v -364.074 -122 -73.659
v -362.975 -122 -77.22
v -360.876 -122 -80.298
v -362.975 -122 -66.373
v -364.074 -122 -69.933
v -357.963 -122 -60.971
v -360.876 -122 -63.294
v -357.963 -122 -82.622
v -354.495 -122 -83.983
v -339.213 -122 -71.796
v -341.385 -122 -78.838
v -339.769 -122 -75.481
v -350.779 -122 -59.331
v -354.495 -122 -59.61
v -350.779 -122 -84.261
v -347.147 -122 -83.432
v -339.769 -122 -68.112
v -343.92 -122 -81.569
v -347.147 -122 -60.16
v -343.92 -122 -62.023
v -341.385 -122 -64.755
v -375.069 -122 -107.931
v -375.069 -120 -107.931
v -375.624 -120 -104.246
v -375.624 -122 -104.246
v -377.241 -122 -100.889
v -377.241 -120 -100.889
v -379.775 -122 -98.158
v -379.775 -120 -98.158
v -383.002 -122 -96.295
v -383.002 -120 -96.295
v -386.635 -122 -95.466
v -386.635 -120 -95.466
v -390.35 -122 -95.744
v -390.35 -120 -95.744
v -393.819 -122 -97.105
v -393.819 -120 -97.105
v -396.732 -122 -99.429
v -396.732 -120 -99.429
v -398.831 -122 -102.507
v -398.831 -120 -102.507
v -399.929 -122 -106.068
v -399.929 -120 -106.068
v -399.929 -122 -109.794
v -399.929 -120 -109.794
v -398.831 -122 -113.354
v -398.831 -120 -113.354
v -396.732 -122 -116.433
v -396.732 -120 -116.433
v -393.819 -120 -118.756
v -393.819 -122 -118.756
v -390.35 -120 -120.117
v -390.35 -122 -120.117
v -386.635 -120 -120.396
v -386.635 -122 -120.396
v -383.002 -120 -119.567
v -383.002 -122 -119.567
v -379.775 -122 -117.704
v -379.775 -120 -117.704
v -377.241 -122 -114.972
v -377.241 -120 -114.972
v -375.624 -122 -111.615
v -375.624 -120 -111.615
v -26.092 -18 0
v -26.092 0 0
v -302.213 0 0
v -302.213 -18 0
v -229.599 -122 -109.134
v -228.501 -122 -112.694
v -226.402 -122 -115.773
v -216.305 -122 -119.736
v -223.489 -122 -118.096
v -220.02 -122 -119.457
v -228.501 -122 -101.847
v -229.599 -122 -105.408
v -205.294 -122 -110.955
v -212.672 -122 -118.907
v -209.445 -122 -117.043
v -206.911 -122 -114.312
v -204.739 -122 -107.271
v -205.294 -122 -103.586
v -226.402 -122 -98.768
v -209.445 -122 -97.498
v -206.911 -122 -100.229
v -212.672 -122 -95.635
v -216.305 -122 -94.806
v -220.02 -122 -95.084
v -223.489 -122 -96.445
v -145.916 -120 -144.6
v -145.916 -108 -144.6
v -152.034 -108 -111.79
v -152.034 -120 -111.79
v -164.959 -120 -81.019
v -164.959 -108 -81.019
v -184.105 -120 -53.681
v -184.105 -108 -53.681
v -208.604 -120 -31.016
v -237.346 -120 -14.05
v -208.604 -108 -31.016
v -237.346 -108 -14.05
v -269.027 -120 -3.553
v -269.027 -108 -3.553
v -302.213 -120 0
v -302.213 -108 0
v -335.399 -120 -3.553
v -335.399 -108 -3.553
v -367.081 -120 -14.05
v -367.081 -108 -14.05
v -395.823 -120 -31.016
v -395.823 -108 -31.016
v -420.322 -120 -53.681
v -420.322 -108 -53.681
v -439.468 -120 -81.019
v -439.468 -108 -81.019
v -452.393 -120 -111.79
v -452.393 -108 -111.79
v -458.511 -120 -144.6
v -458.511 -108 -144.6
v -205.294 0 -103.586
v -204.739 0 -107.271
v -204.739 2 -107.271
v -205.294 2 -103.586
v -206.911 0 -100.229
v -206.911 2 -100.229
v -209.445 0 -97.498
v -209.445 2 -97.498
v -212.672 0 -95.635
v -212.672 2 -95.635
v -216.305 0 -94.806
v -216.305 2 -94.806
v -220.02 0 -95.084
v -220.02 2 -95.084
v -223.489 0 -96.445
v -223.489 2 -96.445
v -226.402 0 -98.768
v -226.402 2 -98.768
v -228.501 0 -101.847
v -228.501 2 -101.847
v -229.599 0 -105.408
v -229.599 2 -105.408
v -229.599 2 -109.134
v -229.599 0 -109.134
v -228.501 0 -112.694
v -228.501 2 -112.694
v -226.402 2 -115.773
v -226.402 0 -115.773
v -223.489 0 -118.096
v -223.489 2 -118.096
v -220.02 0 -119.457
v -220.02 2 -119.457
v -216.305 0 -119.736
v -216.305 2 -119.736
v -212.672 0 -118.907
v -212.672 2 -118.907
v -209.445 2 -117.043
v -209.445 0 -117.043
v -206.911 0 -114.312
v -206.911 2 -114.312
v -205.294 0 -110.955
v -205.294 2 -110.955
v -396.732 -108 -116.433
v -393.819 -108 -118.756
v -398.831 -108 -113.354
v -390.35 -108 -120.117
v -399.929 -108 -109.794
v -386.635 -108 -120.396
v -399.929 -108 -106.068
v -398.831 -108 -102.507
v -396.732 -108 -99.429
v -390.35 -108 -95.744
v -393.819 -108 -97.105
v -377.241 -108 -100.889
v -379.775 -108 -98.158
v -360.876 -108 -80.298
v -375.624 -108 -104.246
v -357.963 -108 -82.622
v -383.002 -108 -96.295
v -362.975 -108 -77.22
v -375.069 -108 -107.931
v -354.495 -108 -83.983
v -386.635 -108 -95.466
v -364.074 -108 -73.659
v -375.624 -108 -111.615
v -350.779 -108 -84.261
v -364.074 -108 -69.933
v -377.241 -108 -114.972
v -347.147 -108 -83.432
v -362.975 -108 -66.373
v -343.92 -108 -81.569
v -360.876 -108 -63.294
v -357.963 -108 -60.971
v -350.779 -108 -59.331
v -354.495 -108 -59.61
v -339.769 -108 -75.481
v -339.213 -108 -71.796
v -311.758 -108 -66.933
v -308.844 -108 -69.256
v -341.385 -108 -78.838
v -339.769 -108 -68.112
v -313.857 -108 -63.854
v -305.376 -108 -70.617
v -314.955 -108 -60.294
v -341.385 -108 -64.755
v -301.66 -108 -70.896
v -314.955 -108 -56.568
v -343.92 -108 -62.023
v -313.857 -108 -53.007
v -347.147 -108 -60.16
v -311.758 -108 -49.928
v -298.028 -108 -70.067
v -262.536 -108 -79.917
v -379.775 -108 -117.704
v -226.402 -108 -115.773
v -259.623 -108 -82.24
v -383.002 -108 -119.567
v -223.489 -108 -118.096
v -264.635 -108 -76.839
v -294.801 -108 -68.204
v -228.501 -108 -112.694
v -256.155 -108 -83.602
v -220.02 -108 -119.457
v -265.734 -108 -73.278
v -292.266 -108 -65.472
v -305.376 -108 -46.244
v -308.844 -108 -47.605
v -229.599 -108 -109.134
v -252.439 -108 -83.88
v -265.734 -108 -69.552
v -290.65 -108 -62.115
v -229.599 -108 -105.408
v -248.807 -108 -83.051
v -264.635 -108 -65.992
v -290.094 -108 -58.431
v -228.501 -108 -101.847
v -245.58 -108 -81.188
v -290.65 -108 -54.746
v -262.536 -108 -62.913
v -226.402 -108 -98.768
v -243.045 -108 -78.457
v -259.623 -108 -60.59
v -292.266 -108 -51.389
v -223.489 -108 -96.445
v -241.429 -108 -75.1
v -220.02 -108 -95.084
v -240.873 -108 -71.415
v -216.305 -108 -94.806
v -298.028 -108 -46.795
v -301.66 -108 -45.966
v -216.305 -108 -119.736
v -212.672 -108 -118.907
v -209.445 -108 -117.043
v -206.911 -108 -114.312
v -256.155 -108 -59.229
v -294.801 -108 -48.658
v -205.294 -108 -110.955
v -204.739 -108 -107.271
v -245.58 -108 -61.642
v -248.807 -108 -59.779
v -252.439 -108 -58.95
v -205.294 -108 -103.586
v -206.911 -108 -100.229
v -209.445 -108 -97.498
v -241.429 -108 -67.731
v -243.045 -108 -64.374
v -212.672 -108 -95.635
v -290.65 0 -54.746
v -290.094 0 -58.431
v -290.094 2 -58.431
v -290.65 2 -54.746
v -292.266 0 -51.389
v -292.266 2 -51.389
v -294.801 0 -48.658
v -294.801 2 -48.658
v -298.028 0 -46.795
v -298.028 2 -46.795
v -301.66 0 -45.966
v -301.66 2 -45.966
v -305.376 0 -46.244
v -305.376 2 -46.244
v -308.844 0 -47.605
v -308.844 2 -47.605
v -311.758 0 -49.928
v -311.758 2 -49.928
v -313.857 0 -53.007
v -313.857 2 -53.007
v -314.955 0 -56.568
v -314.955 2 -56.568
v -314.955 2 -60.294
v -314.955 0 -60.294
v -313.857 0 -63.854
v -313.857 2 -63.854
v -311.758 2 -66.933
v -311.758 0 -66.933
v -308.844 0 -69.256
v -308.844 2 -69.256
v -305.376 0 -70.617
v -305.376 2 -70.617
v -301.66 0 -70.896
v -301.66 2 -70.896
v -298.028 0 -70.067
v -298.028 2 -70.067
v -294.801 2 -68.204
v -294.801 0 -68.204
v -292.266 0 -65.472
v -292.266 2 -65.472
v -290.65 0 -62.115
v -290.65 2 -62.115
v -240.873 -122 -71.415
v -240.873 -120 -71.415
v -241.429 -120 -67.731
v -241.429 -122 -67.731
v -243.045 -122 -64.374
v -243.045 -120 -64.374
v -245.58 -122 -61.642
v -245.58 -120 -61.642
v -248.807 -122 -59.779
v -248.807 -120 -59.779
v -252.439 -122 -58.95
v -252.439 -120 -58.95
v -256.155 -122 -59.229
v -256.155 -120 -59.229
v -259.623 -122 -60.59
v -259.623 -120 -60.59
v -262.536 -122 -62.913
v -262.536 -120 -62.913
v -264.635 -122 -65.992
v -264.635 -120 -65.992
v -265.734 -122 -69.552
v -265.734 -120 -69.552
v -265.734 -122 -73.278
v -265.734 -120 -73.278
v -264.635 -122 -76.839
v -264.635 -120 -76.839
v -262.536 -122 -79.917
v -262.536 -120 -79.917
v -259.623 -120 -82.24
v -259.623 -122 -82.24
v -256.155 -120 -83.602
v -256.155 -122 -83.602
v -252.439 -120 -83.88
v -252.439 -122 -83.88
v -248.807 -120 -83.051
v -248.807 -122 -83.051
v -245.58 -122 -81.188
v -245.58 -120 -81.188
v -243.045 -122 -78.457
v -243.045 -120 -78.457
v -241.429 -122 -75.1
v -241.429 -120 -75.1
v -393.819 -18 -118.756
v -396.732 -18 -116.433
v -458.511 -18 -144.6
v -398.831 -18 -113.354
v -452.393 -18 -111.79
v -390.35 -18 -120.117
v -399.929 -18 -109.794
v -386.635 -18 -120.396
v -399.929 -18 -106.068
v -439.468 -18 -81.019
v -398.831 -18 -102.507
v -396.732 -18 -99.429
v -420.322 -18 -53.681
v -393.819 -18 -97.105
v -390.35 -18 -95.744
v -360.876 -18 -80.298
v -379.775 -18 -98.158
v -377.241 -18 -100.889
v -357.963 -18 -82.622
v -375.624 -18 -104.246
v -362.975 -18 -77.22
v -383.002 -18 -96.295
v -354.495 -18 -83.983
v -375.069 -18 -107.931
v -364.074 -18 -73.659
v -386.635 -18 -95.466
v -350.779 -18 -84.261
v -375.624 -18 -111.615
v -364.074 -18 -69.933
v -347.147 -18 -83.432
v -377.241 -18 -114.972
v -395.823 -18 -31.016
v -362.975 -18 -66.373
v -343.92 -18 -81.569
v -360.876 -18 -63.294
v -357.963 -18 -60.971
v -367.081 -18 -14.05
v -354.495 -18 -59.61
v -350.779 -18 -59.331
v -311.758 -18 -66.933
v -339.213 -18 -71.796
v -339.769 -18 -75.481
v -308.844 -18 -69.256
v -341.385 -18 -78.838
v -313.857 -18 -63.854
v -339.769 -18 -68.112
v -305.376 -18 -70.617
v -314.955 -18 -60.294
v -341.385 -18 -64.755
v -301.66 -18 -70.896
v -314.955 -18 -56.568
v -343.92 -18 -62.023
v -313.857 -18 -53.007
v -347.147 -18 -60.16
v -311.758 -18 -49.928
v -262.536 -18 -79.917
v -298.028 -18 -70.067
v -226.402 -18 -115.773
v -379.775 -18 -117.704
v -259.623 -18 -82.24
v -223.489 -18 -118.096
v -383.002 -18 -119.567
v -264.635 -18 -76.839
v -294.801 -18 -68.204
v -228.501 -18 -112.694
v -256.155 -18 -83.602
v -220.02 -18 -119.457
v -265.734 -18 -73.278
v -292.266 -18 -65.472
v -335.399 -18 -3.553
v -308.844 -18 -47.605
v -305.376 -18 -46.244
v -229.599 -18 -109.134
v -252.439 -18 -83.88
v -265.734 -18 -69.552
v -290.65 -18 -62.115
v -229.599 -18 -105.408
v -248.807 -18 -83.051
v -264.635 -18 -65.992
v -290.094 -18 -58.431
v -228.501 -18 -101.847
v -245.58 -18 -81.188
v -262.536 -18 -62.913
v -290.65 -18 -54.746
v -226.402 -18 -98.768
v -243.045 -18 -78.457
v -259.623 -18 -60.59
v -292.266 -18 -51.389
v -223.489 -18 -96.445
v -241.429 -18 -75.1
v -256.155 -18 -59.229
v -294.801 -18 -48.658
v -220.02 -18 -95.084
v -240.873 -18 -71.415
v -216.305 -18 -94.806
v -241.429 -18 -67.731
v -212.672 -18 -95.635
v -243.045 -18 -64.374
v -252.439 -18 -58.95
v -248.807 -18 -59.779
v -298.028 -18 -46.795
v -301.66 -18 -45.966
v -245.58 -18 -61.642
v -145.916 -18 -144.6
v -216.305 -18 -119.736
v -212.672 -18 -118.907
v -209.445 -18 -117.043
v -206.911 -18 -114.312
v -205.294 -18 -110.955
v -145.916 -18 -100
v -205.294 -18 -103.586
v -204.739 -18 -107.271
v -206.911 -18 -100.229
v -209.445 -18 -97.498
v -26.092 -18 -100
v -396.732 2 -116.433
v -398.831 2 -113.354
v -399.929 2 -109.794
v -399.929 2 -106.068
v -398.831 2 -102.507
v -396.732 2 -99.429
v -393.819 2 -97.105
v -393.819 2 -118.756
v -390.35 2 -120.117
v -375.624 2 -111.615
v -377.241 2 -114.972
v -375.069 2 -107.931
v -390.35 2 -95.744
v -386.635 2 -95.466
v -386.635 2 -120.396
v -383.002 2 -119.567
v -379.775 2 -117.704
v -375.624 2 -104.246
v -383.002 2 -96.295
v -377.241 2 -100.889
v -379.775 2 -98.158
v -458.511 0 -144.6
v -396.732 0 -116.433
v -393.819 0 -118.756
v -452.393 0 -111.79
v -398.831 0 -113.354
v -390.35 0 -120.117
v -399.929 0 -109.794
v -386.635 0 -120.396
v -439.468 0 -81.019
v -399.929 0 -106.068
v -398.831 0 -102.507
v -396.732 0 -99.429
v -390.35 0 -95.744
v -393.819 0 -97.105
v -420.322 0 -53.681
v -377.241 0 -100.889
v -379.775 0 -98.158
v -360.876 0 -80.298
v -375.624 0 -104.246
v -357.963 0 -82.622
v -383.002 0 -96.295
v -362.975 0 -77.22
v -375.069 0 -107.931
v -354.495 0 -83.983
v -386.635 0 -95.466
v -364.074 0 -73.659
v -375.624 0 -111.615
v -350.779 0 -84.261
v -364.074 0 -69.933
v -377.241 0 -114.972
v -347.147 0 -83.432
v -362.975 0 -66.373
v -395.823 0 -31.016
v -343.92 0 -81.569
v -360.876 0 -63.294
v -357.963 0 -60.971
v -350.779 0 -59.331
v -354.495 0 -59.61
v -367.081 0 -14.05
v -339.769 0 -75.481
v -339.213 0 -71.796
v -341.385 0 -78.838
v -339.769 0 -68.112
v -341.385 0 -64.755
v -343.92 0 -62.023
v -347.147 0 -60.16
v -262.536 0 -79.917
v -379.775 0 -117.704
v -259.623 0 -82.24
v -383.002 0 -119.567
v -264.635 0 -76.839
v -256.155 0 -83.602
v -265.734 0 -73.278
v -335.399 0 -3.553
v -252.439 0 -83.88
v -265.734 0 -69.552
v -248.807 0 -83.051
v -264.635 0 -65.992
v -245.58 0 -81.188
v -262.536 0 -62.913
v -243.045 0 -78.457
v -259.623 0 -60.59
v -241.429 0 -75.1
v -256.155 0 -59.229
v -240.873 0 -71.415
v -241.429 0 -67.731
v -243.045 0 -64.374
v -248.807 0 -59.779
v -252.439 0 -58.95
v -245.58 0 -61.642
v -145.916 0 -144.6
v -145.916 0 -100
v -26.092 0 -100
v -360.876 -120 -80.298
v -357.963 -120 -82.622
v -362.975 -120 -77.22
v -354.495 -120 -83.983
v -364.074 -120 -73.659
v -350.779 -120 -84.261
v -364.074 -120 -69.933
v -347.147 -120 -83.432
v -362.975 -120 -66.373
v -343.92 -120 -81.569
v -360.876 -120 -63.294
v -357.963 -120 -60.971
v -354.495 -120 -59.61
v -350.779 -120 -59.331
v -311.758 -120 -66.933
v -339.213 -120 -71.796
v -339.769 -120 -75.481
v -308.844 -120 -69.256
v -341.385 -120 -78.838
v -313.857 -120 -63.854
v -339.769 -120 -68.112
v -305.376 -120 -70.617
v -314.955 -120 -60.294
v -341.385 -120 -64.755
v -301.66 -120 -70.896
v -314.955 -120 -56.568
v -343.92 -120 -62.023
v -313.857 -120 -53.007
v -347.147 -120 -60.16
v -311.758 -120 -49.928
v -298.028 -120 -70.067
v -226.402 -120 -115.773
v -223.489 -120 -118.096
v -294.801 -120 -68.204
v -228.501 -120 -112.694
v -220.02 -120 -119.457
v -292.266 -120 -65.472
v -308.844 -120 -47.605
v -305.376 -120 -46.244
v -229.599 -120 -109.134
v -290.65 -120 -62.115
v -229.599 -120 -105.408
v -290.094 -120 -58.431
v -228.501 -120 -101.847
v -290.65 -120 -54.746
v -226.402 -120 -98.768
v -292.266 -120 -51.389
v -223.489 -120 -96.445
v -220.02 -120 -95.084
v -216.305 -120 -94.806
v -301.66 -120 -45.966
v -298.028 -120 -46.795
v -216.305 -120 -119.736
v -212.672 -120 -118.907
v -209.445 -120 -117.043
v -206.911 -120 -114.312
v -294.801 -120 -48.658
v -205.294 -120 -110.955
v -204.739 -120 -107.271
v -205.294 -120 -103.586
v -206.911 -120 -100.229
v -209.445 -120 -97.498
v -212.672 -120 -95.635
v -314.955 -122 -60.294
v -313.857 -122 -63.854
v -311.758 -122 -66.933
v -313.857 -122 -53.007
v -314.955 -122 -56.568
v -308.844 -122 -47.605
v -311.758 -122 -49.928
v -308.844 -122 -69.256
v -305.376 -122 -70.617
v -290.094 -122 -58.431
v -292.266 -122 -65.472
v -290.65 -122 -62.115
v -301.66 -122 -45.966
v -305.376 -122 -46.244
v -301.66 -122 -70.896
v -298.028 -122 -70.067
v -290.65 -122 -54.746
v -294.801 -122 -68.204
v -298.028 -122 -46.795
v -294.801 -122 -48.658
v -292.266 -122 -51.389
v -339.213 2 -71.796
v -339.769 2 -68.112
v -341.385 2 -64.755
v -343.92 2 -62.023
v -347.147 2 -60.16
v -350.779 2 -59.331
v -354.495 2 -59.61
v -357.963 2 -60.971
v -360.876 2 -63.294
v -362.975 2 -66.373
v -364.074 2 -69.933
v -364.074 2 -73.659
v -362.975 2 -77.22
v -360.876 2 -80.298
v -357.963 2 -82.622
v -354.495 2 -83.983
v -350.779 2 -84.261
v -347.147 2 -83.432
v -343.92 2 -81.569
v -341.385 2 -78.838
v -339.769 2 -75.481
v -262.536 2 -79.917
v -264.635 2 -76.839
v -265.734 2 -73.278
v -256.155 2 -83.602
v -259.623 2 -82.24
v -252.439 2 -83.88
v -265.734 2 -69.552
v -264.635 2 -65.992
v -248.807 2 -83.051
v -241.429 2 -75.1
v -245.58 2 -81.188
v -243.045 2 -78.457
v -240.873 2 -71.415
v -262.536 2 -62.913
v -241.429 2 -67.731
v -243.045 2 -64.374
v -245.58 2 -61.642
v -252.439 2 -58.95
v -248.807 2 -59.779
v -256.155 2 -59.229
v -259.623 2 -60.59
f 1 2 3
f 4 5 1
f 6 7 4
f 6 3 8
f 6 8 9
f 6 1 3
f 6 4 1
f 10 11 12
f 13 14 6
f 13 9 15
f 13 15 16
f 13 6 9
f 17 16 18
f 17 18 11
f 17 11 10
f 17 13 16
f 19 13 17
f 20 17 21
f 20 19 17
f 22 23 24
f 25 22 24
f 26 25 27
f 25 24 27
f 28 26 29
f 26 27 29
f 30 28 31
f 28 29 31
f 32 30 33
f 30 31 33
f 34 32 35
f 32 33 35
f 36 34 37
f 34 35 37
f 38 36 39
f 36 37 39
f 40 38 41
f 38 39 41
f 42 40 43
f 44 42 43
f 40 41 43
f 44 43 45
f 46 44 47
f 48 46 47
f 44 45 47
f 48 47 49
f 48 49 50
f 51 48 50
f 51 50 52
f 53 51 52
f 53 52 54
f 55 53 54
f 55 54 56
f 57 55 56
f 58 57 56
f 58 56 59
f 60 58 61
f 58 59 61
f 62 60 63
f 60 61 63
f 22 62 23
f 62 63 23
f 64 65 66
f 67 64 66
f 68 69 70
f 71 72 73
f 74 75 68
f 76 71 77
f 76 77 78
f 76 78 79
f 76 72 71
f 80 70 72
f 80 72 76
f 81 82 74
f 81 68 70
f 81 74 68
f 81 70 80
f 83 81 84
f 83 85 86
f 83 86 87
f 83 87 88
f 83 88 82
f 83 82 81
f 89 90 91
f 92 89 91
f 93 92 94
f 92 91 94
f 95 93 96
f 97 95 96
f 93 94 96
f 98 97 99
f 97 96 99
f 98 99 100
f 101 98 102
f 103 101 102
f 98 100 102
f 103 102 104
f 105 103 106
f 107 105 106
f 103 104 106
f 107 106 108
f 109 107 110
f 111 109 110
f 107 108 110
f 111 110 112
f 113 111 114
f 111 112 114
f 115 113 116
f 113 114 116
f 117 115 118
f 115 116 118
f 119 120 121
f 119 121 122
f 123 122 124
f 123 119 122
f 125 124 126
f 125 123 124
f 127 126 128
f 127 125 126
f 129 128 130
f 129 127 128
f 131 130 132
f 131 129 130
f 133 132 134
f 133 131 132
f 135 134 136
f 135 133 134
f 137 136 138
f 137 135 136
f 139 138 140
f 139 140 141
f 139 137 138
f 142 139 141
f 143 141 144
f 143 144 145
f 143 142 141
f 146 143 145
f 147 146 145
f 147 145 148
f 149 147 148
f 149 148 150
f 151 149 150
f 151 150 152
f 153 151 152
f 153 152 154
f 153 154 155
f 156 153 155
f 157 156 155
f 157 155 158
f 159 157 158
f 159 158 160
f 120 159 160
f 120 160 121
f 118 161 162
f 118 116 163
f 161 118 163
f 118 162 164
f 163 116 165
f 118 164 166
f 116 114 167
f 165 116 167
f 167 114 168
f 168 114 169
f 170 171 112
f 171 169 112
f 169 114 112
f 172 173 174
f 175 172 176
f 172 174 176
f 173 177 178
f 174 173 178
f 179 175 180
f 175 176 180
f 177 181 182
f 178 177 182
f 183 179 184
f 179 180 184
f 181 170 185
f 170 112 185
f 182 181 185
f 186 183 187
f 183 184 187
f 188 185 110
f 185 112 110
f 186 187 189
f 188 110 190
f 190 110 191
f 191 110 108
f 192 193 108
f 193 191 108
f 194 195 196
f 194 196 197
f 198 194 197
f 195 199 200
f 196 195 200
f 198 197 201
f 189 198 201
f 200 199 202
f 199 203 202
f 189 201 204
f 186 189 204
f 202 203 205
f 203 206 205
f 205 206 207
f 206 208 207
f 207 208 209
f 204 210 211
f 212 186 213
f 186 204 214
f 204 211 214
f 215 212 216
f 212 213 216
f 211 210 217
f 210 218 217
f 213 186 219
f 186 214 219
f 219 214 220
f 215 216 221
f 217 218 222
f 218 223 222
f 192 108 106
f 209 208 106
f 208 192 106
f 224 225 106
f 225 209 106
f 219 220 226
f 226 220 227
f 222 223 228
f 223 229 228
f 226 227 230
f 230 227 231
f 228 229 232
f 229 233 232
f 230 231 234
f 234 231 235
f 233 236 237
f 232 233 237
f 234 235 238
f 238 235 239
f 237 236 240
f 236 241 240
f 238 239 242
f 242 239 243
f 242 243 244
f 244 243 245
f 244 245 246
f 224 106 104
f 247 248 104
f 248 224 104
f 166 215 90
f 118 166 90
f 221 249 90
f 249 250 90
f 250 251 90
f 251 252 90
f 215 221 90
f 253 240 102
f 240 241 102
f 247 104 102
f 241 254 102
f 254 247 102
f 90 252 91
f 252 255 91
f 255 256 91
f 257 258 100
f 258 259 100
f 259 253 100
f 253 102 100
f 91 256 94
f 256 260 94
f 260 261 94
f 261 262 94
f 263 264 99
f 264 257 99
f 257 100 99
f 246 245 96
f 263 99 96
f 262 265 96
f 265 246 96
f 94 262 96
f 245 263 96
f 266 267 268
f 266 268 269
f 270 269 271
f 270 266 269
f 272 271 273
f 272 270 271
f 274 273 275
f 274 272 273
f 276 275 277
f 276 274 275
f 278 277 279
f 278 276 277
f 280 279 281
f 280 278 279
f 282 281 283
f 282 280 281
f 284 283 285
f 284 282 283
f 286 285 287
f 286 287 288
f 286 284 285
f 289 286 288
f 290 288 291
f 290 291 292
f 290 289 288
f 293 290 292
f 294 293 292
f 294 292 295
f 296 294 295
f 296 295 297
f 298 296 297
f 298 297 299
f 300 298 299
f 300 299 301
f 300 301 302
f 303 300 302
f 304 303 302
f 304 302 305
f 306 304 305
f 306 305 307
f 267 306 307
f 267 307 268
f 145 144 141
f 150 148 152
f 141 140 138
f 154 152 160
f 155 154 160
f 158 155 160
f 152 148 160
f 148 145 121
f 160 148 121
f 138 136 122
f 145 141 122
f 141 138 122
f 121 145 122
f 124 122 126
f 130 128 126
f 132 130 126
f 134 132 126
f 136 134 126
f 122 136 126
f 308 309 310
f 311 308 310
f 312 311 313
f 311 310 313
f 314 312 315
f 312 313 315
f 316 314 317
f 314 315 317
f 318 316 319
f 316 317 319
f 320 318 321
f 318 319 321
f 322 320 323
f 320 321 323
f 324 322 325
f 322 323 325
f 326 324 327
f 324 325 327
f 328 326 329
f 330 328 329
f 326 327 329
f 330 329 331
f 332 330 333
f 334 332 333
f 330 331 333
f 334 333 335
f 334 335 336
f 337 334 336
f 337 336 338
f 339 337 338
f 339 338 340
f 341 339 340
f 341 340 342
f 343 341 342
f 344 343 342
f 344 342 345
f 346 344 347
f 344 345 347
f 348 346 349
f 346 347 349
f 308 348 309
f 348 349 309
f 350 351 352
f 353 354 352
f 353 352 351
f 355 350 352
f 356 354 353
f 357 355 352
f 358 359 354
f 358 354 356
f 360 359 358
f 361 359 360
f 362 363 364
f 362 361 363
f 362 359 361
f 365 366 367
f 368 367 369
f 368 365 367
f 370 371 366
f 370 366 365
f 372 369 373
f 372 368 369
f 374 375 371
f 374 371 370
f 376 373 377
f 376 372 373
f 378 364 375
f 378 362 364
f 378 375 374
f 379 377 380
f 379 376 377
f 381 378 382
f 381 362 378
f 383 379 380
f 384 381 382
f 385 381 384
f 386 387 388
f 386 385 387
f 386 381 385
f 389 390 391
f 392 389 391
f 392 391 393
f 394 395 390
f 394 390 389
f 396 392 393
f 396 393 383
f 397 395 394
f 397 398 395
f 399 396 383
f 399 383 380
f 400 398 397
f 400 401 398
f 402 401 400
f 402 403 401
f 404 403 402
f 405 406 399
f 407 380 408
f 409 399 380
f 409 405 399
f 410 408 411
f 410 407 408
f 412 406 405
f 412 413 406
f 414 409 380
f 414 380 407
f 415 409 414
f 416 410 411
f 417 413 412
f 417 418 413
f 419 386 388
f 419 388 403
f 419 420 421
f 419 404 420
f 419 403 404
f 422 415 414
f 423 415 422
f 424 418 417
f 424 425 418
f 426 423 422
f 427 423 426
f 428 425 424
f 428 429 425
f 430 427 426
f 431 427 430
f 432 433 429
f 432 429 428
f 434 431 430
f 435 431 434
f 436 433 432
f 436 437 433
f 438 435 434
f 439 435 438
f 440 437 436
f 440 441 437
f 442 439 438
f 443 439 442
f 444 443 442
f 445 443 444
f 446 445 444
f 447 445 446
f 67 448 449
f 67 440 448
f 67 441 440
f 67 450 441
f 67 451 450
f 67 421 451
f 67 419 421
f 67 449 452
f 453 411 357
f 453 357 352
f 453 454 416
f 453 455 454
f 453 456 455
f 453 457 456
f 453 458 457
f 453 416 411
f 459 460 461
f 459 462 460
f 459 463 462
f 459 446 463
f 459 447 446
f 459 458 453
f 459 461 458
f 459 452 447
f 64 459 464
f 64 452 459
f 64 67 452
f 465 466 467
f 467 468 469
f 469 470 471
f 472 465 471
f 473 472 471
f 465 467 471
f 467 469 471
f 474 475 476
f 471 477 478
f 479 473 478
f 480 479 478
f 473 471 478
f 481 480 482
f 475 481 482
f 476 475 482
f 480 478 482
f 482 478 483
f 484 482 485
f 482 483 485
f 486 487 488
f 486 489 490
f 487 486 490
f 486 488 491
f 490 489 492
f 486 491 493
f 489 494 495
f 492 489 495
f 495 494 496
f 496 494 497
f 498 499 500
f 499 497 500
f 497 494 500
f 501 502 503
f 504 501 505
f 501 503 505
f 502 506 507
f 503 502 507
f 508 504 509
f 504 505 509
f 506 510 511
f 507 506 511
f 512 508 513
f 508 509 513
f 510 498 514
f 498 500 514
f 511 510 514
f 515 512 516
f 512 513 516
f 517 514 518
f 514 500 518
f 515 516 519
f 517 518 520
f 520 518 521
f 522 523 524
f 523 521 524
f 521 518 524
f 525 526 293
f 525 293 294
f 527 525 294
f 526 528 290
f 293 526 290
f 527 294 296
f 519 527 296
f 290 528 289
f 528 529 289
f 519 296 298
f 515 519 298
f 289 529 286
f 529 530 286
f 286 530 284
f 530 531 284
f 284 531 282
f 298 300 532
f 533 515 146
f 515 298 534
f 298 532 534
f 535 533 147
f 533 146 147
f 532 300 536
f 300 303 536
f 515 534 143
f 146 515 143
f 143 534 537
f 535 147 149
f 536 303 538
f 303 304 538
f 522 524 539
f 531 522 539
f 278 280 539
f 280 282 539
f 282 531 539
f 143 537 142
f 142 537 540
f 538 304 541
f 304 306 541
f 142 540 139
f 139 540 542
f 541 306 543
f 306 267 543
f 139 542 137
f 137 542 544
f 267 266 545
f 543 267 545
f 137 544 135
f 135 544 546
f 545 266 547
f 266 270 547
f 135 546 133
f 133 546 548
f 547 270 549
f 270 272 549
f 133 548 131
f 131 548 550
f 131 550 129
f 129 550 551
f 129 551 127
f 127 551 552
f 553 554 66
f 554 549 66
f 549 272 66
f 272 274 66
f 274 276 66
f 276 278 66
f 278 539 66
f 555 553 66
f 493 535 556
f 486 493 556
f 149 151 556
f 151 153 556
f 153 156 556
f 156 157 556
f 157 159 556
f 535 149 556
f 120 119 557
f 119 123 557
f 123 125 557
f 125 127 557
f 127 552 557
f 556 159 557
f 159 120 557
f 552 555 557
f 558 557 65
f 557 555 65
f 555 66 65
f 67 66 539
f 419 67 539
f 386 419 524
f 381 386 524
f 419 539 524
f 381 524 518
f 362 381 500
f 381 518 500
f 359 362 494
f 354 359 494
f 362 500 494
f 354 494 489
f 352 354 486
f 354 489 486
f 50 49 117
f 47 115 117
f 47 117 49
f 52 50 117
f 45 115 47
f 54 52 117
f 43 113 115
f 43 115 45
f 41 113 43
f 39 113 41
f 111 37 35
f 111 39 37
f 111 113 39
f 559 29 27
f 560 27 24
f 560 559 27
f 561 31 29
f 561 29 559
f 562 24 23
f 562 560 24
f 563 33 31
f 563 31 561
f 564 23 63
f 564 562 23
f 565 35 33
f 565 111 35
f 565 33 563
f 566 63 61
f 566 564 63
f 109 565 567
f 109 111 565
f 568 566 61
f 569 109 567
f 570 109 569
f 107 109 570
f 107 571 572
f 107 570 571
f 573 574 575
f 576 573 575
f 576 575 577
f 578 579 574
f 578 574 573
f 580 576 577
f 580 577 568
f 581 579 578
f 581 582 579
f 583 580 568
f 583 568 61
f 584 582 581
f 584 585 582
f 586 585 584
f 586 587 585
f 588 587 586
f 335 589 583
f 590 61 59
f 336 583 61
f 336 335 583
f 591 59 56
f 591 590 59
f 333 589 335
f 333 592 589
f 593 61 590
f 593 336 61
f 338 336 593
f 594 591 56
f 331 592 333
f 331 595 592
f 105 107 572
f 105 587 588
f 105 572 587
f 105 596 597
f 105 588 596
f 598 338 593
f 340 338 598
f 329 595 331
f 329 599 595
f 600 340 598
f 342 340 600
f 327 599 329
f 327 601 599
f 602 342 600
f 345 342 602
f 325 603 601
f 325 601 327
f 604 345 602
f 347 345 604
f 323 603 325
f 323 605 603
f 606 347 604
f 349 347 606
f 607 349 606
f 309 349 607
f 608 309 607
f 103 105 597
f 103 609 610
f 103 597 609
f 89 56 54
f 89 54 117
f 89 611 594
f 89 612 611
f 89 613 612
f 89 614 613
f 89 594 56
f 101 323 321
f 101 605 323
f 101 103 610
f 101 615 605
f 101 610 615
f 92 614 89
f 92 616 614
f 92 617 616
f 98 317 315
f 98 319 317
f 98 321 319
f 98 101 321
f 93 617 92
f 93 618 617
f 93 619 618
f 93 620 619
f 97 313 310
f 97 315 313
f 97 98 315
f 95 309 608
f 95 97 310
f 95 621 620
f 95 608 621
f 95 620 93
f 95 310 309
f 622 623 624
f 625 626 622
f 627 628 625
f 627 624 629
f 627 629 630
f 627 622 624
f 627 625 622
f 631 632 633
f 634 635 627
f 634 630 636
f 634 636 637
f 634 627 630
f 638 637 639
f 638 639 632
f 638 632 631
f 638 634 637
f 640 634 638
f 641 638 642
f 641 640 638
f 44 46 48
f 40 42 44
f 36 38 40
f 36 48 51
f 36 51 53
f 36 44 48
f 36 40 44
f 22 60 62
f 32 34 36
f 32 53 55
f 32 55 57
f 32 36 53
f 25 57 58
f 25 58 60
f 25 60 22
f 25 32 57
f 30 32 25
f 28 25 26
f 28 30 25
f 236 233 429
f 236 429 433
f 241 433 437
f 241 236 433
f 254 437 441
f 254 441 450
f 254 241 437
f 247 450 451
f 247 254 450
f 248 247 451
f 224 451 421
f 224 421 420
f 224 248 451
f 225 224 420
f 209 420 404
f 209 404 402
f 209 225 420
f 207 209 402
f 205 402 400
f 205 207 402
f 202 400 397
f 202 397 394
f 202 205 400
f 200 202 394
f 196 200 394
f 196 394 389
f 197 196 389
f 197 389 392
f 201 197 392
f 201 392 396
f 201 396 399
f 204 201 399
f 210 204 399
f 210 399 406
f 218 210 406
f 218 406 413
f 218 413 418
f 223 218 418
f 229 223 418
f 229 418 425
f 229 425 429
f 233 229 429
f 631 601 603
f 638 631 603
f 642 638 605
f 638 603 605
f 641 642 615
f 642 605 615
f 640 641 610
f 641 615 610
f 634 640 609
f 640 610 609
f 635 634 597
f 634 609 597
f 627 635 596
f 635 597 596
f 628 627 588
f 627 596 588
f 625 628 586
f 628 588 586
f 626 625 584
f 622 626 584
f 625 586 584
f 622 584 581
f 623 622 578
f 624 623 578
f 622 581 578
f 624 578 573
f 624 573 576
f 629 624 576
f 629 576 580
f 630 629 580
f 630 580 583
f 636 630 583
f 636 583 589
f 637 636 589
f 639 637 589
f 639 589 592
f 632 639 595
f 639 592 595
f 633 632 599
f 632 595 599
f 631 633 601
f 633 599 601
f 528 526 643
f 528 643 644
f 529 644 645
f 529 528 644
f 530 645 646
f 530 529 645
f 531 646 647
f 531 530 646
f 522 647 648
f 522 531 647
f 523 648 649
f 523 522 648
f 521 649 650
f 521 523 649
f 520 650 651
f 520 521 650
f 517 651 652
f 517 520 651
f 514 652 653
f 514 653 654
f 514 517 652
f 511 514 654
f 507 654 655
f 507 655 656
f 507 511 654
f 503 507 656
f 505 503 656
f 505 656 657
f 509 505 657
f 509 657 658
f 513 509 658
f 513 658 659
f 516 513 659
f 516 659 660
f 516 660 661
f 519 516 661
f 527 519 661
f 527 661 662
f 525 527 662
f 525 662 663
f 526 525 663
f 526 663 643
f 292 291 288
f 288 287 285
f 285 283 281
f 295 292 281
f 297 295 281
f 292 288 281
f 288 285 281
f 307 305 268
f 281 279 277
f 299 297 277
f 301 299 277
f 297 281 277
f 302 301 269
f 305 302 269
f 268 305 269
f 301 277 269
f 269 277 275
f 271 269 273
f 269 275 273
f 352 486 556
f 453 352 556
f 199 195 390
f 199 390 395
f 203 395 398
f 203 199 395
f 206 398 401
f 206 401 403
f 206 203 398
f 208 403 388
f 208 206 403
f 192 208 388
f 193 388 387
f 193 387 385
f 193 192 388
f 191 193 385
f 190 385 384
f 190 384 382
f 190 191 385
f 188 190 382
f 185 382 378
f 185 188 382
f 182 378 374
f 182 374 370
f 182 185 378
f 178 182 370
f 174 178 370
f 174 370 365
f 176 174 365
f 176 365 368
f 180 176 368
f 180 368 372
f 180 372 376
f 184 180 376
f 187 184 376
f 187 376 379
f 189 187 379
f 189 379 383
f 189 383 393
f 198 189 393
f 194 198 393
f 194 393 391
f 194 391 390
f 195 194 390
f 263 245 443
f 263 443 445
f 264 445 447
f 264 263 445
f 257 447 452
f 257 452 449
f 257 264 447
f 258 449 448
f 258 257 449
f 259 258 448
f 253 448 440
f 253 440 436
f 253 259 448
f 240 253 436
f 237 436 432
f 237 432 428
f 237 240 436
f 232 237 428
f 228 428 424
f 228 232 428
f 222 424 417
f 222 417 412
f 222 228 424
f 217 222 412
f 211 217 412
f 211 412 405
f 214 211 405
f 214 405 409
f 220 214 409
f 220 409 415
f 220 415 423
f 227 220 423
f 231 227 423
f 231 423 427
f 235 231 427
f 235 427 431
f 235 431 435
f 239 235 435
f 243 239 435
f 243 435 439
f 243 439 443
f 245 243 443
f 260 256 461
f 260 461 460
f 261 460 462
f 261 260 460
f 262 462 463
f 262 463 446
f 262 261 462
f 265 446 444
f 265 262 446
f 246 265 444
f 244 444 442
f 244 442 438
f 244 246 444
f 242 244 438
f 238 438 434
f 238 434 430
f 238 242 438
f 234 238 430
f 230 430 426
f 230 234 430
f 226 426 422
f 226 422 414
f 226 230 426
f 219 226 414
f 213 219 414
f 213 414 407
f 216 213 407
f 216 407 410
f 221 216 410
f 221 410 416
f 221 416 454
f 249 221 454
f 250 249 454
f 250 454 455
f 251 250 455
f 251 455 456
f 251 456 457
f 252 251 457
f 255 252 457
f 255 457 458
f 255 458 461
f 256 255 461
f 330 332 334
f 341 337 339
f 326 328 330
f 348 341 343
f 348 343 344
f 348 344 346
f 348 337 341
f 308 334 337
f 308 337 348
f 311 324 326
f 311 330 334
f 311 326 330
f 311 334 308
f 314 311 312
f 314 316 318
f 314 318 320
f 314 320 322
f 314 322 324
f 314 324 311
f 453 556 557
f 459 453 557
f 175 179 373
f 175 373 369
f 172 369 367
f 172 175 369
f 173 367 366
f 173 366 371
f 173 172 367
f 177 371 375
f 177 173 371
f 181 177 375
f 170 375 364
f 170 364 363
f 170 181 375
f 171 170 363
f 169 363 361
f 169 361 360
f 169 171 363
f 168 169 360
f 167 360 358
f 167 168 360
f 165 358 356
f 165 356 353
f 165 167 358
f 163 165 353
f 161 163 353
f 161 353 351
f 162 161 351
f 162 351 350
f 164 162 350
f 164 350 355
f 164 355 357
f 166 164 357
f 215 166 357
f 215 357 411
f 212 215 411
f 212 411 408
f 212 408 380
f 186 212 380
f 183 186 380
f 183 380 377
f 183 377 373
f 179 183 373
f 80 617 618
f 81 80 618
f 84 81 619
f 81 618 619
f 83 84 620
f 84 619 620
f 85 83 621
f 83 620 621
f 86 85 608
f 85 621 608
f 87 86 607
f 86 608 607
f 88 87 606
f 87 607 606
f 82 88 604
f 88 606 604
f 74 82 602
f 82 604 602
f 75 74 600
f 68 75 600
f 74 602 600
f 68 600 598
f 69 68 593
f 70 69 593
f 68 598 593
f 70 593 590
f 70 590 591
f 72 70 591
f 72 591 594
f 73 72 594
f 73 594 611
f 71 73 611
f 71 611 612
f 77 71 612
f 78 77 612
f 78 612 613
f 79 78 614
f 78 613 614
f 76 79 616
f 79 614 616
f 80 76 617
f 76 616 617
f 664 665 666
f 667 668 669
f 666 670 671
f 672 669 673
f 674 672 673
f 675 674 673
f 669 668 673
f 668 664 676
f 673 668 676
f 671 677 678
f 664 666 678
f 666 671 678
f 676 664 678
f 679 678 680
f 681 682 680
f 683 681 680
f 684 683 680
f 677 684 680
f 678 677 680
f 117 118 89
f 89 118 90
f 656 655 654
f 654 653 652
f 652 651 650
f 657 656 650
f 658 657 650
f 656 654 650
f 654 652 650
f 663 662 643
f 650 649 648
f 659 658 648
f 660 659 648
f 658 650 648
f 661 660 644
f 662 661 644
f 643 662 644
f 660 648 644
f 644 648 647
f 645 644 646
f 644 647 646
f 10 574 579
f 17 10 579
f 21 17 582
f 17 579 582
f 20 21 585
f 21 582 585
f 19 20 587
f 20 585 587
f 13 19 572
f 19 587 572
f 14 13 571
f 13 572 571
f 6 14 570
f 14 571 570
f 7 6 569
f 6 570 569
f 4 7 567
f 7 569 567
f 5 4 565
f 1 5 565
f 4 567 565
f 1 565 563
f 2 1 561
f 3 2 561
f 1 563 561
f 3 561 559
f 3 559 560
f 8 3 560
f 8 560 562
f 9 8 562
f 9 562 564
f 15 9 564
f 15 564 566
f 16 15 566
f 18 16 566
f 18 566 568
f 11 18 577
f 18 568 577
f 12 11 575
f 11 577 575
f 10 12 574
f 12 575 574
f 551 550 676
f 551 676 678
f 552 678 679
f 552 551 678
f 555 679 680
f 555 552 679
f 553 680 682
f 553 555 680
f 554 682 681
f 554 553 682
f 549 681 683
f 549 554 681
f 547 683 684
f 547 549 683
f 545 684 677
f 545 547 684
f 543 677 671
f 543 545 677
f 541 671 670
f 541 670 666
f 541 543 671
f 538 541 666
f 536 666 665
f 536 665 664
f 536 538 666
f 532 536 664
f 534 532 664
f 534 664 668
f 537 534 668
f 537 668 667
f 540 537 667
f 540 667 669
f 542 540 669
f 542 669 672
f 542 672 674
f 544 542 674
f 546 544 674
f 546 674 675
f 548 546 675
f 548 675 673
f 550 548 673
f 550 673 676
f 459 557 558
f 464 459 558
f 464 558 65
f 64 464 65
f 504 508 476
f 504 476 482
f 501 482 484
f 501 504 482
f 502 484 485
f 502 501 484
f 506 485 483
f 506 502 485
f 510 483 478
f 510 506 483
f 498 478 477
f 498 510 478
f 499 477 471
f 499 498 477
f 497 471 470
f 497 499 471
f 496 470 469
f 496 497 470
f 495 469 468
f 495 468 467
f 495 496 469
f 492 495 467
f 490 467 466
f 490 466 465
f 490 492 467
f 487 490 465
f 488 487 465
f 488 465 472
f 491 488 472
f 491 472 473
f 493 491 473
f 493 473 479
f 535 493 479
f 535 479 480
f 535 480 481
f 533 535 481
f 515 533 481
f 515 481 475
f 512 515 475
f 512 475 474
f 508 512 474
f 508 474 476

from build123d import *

# Parameters (mm, degrees)
F0_R          = 12.5
F1_DEPTH      = 18
F3_R          = 12.5
F4_DEPTH      = 12
F5_R          = 12.5
F6_DEPTH      = 122
F6_DEPTH_BACK = 2


with BuildPart() as f1:
    # F0 (on Front) → F1 (new body)
    with BuildSketch(Plane.XZ):
        with BuildLine():
            Line((-26.0921634734, -100), (-26.0921634734, 0))
            Line((-26.0921634734, 0), (-302.2132738139, 0))
            ThreePointArc((-302.2132738139, 0), (-408.6771422638, -41.6946592259), (-458.5108448572, -144.6004509926))
            Line((-458.5108448572, -144.6004509926), (-145.9157027706, -144.6004509926))
            Line((-145.9157027706, -144.6004509926), (-145.9157027706, -100))
            Line((-145.9157027706, -100), (-26.0921634734, -100))
        make_face()
        with Locations((-387.568802112, -107.9307186779)):
            Circle(F0_R, mode=Mode.SUBTRACT)
        with Locations((-217.2388651936, -107.2706000321)):
            Circle(F0_R, mode=Mode.SUBTRACT)
        with Locations((-351.7133506022, -71.7962682002)):
            Circle(F0_R, mode=Mode.SUBTRACT)
        with Locations((-302.5943934917, -58.4306418896)):
            Circle(F0_R, mode=Mode.SUBTRACT)
        with Locations((-253.3733156713, -71.4151485223)):
            Circle(F0_R, mode=Mode.SUBTRACT)
    extrude(amount=F1_DEPTH)



with BuildPart() as f4:
    # F3 (on offset) → F4 (new body)
    with BuildSketch(Plane.XZ.offset(108)):
        with BuildLine():
            Line((-458.5108448572, -144.6004509926), (-145.9157027706, -144.6004509926))
            ThreePointArc((-145.9157027706, -144.6004509926), (-302.2132738139, 0), (-458.5108448572, -144.6004509926))
        make_face()
        with Locations((-387.568802112, -107.9307186779)):
            Circle(F3_R, mode=Mode.SUBTRACT)
        with Locations((-217.2388651936, -107.2706000321)):
            Circle(F3_R, mode=Mode.SUBTRACT)
        with Locations((-351.7133506022, -71.7962682002)):
            Circle(F3_R, mode=Mode.SUBTRACT)
        with Locations((-302.5943934917, -58.4306418896)):
            Circle(F3_R, mode=Mode.SUBTRACT)
        with Locations((-253.3733156713, -71.4151485223)):
            Circle(F3_R, mode=Mode.SUBTRACT)
    extrude(amount=F4_DEPTH)


with BuildPart() as f1_1:
    add(f1.part)

    add(f4.part)  # F6 merges F4
    # F5 (on face) → F6 (join, two sides)
    with BuildSketch(Plane.XZ.offset(120)) as f6_sk:
        with Locations((-387.568802112, -107.9307186779)):
            Circle(F5_R)
        with Locations((-351.7133506022, -71.7962682002)):
            Circle(F5_R)
        with Locations((-302.5943934917, -58.4306418896)):
            Circle(F5_R)
        with Locations((-253.3733156713, -71.4151485223)):
            Circle(F5_R)
        with Locations((-217.2388651936, -107.2706000321)):
            Circle(F5_R)
    extrude(amount=-F6_DEPTH)
    extrude(f6_sk.sketch, amount=F6_DEPTH_BACK)


solid = f1_1.part
